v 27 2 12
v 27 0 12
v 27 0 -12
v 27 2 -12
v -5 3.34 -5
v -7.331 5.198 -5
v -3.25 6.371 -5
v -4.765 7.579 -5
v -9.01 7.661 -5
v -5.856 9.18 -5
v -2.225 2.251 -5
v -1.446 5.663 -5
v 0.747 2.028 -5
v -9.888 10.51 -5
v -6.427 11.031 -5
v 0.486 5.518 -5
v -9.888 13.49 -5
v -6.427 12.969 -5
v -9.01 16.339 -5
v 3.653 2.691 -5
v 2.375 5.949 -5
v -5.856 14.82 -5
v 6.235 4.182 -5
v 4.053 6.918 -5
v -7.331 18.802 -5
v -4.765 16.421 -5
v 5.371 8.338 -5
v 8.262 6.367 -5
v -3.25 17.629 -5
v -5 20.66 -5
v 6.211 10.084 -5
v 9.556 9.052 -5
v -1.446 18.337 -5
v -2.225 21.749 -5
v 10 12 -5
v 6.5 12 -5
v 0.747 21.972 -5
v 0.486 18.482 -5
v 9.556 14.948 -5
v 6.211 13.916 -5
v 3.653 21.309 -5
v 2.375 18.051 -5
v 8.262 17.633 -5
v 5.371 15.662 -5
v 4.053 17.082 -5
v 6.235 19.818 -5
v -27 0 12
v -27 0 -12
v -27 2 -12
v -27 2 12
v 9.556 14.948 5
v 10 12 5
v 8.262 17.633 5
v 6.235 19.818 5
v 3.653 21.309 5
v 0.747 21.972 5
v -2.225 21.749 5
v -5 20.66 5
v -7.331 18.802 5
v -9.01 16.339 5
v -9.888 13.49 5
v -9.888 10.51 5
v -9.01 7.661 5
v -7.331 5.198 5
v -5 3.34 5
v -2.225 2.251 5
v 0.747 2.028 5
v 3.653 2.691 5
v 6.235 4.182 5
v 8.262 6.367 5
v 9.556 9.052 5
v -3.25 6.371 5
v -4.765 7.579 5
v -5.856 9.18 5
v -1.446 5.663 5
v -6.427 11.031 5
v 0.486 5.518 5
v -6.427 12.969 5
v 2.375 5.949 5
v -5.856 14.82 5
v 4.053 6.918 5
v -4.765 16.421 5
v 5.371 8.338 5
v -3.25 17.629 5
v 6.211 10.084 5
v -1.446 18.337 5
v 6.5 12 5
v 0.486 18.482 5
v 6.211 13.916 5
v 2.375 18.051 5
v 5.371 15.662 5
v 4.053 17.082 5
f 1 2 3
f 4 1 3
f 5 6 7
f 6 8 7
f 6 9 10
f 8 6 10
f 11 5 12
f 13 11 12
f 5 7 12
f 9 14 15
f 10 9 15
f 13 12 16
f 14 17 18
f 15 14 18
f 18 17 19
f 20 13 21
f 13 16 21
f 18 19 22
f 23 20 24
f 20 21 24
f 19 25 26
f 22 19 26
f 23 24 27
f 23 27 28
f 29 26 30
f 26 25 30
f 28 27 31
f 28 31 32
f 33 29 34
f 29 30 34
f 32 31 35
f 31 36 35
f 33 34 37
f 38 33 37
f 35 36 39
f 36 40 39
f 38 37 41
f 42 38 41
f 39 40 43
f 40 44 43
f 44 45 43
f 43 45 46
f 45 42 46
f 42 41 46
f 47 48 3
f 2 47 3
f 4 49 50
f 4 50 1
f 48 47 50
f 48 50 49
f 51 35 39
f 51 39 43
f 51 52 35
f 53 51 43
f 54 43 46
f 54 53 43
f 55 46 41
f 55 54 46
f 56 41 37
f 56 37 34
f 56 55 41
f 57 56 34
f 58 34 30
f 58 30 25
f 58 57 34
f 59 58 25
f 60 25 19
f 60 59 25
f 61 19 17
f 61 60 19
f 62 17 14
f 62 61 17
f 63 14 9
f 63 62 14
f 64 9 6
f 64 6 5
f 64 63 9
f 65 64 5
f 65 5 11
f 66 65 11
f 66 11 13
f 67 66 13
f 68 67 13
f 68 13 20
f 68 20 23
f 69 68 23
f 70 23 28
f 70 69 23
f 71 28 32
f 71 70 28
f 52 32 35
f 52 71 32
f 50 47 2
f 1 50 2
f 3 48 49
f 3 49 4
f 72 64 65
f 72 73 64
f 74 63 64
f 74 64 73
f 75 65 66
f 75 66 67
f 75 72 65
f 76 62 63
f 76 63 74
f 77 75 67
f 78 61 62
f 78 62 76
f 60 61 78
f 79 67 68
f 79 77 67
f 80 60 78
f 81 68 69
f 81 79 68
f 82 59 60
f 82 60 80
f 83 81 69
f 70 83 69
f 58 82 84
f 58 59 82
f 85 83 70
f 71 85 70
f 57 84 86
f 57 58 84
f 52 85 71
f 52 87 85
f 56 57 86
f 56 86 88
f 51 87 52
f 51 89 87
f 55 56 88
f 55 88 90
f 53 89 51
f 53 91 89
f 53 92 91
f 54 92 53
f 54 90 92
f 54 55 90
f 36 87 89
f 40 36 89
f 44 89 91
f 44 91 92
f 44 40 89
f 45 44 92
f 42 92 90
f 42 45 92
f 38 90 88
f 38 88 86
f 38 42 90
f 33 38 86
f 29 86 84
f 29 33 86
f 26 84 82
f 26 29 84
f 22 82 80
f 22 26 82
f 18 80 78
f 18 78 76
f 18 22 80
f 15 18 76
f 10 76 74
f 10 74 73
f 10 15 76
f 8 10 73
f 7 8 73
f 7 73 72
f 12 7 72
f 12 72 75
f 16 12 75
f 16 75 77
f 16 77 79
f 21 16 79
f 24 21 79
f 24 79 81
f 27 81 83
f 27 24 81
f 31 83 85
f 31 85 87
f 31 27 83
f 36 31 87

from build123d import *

# Parameters (mm, degrees)
SKETCH1_W           = 54
SKETCH1_H           = 24
BOSS_EXTRUDE1_DEPTH = 2
SKETCH2_R           = 10
SKETCH2_R_2         = 6.5
BOSS_EXTRUDE2_DEPTH = 5


with BuildPart() as part:
    # Sketch1 → Boss-Extrude1 (new body)
    with BuildSketch(Plane(origin=(0, 0, 0), x_dir=(1, 0, 0), z_dir=(0, 1, 0))):
        Rectangle(SKETCH1_W, SKETCH1_H)
    extrude(amount=BOSS_EXTRUDE1_DEPTH)


with BuildPart() as body_2:
    # Sketch2 → Boss-Extrude2 (new body, symmetric)
    with BuildSketch(Plane.XY):
        with Locations((0, 12)):
            Circle(SKETCH2_R)
        with Locations((0, 12)):
            Circle(SKETCH2_R_2, mode=Mode.SUBTRACT)
    extrude(amount=BOSS_EXTRUDE2_DEPTH, both=True)


solid = Compound([part.part, body_2.part])
